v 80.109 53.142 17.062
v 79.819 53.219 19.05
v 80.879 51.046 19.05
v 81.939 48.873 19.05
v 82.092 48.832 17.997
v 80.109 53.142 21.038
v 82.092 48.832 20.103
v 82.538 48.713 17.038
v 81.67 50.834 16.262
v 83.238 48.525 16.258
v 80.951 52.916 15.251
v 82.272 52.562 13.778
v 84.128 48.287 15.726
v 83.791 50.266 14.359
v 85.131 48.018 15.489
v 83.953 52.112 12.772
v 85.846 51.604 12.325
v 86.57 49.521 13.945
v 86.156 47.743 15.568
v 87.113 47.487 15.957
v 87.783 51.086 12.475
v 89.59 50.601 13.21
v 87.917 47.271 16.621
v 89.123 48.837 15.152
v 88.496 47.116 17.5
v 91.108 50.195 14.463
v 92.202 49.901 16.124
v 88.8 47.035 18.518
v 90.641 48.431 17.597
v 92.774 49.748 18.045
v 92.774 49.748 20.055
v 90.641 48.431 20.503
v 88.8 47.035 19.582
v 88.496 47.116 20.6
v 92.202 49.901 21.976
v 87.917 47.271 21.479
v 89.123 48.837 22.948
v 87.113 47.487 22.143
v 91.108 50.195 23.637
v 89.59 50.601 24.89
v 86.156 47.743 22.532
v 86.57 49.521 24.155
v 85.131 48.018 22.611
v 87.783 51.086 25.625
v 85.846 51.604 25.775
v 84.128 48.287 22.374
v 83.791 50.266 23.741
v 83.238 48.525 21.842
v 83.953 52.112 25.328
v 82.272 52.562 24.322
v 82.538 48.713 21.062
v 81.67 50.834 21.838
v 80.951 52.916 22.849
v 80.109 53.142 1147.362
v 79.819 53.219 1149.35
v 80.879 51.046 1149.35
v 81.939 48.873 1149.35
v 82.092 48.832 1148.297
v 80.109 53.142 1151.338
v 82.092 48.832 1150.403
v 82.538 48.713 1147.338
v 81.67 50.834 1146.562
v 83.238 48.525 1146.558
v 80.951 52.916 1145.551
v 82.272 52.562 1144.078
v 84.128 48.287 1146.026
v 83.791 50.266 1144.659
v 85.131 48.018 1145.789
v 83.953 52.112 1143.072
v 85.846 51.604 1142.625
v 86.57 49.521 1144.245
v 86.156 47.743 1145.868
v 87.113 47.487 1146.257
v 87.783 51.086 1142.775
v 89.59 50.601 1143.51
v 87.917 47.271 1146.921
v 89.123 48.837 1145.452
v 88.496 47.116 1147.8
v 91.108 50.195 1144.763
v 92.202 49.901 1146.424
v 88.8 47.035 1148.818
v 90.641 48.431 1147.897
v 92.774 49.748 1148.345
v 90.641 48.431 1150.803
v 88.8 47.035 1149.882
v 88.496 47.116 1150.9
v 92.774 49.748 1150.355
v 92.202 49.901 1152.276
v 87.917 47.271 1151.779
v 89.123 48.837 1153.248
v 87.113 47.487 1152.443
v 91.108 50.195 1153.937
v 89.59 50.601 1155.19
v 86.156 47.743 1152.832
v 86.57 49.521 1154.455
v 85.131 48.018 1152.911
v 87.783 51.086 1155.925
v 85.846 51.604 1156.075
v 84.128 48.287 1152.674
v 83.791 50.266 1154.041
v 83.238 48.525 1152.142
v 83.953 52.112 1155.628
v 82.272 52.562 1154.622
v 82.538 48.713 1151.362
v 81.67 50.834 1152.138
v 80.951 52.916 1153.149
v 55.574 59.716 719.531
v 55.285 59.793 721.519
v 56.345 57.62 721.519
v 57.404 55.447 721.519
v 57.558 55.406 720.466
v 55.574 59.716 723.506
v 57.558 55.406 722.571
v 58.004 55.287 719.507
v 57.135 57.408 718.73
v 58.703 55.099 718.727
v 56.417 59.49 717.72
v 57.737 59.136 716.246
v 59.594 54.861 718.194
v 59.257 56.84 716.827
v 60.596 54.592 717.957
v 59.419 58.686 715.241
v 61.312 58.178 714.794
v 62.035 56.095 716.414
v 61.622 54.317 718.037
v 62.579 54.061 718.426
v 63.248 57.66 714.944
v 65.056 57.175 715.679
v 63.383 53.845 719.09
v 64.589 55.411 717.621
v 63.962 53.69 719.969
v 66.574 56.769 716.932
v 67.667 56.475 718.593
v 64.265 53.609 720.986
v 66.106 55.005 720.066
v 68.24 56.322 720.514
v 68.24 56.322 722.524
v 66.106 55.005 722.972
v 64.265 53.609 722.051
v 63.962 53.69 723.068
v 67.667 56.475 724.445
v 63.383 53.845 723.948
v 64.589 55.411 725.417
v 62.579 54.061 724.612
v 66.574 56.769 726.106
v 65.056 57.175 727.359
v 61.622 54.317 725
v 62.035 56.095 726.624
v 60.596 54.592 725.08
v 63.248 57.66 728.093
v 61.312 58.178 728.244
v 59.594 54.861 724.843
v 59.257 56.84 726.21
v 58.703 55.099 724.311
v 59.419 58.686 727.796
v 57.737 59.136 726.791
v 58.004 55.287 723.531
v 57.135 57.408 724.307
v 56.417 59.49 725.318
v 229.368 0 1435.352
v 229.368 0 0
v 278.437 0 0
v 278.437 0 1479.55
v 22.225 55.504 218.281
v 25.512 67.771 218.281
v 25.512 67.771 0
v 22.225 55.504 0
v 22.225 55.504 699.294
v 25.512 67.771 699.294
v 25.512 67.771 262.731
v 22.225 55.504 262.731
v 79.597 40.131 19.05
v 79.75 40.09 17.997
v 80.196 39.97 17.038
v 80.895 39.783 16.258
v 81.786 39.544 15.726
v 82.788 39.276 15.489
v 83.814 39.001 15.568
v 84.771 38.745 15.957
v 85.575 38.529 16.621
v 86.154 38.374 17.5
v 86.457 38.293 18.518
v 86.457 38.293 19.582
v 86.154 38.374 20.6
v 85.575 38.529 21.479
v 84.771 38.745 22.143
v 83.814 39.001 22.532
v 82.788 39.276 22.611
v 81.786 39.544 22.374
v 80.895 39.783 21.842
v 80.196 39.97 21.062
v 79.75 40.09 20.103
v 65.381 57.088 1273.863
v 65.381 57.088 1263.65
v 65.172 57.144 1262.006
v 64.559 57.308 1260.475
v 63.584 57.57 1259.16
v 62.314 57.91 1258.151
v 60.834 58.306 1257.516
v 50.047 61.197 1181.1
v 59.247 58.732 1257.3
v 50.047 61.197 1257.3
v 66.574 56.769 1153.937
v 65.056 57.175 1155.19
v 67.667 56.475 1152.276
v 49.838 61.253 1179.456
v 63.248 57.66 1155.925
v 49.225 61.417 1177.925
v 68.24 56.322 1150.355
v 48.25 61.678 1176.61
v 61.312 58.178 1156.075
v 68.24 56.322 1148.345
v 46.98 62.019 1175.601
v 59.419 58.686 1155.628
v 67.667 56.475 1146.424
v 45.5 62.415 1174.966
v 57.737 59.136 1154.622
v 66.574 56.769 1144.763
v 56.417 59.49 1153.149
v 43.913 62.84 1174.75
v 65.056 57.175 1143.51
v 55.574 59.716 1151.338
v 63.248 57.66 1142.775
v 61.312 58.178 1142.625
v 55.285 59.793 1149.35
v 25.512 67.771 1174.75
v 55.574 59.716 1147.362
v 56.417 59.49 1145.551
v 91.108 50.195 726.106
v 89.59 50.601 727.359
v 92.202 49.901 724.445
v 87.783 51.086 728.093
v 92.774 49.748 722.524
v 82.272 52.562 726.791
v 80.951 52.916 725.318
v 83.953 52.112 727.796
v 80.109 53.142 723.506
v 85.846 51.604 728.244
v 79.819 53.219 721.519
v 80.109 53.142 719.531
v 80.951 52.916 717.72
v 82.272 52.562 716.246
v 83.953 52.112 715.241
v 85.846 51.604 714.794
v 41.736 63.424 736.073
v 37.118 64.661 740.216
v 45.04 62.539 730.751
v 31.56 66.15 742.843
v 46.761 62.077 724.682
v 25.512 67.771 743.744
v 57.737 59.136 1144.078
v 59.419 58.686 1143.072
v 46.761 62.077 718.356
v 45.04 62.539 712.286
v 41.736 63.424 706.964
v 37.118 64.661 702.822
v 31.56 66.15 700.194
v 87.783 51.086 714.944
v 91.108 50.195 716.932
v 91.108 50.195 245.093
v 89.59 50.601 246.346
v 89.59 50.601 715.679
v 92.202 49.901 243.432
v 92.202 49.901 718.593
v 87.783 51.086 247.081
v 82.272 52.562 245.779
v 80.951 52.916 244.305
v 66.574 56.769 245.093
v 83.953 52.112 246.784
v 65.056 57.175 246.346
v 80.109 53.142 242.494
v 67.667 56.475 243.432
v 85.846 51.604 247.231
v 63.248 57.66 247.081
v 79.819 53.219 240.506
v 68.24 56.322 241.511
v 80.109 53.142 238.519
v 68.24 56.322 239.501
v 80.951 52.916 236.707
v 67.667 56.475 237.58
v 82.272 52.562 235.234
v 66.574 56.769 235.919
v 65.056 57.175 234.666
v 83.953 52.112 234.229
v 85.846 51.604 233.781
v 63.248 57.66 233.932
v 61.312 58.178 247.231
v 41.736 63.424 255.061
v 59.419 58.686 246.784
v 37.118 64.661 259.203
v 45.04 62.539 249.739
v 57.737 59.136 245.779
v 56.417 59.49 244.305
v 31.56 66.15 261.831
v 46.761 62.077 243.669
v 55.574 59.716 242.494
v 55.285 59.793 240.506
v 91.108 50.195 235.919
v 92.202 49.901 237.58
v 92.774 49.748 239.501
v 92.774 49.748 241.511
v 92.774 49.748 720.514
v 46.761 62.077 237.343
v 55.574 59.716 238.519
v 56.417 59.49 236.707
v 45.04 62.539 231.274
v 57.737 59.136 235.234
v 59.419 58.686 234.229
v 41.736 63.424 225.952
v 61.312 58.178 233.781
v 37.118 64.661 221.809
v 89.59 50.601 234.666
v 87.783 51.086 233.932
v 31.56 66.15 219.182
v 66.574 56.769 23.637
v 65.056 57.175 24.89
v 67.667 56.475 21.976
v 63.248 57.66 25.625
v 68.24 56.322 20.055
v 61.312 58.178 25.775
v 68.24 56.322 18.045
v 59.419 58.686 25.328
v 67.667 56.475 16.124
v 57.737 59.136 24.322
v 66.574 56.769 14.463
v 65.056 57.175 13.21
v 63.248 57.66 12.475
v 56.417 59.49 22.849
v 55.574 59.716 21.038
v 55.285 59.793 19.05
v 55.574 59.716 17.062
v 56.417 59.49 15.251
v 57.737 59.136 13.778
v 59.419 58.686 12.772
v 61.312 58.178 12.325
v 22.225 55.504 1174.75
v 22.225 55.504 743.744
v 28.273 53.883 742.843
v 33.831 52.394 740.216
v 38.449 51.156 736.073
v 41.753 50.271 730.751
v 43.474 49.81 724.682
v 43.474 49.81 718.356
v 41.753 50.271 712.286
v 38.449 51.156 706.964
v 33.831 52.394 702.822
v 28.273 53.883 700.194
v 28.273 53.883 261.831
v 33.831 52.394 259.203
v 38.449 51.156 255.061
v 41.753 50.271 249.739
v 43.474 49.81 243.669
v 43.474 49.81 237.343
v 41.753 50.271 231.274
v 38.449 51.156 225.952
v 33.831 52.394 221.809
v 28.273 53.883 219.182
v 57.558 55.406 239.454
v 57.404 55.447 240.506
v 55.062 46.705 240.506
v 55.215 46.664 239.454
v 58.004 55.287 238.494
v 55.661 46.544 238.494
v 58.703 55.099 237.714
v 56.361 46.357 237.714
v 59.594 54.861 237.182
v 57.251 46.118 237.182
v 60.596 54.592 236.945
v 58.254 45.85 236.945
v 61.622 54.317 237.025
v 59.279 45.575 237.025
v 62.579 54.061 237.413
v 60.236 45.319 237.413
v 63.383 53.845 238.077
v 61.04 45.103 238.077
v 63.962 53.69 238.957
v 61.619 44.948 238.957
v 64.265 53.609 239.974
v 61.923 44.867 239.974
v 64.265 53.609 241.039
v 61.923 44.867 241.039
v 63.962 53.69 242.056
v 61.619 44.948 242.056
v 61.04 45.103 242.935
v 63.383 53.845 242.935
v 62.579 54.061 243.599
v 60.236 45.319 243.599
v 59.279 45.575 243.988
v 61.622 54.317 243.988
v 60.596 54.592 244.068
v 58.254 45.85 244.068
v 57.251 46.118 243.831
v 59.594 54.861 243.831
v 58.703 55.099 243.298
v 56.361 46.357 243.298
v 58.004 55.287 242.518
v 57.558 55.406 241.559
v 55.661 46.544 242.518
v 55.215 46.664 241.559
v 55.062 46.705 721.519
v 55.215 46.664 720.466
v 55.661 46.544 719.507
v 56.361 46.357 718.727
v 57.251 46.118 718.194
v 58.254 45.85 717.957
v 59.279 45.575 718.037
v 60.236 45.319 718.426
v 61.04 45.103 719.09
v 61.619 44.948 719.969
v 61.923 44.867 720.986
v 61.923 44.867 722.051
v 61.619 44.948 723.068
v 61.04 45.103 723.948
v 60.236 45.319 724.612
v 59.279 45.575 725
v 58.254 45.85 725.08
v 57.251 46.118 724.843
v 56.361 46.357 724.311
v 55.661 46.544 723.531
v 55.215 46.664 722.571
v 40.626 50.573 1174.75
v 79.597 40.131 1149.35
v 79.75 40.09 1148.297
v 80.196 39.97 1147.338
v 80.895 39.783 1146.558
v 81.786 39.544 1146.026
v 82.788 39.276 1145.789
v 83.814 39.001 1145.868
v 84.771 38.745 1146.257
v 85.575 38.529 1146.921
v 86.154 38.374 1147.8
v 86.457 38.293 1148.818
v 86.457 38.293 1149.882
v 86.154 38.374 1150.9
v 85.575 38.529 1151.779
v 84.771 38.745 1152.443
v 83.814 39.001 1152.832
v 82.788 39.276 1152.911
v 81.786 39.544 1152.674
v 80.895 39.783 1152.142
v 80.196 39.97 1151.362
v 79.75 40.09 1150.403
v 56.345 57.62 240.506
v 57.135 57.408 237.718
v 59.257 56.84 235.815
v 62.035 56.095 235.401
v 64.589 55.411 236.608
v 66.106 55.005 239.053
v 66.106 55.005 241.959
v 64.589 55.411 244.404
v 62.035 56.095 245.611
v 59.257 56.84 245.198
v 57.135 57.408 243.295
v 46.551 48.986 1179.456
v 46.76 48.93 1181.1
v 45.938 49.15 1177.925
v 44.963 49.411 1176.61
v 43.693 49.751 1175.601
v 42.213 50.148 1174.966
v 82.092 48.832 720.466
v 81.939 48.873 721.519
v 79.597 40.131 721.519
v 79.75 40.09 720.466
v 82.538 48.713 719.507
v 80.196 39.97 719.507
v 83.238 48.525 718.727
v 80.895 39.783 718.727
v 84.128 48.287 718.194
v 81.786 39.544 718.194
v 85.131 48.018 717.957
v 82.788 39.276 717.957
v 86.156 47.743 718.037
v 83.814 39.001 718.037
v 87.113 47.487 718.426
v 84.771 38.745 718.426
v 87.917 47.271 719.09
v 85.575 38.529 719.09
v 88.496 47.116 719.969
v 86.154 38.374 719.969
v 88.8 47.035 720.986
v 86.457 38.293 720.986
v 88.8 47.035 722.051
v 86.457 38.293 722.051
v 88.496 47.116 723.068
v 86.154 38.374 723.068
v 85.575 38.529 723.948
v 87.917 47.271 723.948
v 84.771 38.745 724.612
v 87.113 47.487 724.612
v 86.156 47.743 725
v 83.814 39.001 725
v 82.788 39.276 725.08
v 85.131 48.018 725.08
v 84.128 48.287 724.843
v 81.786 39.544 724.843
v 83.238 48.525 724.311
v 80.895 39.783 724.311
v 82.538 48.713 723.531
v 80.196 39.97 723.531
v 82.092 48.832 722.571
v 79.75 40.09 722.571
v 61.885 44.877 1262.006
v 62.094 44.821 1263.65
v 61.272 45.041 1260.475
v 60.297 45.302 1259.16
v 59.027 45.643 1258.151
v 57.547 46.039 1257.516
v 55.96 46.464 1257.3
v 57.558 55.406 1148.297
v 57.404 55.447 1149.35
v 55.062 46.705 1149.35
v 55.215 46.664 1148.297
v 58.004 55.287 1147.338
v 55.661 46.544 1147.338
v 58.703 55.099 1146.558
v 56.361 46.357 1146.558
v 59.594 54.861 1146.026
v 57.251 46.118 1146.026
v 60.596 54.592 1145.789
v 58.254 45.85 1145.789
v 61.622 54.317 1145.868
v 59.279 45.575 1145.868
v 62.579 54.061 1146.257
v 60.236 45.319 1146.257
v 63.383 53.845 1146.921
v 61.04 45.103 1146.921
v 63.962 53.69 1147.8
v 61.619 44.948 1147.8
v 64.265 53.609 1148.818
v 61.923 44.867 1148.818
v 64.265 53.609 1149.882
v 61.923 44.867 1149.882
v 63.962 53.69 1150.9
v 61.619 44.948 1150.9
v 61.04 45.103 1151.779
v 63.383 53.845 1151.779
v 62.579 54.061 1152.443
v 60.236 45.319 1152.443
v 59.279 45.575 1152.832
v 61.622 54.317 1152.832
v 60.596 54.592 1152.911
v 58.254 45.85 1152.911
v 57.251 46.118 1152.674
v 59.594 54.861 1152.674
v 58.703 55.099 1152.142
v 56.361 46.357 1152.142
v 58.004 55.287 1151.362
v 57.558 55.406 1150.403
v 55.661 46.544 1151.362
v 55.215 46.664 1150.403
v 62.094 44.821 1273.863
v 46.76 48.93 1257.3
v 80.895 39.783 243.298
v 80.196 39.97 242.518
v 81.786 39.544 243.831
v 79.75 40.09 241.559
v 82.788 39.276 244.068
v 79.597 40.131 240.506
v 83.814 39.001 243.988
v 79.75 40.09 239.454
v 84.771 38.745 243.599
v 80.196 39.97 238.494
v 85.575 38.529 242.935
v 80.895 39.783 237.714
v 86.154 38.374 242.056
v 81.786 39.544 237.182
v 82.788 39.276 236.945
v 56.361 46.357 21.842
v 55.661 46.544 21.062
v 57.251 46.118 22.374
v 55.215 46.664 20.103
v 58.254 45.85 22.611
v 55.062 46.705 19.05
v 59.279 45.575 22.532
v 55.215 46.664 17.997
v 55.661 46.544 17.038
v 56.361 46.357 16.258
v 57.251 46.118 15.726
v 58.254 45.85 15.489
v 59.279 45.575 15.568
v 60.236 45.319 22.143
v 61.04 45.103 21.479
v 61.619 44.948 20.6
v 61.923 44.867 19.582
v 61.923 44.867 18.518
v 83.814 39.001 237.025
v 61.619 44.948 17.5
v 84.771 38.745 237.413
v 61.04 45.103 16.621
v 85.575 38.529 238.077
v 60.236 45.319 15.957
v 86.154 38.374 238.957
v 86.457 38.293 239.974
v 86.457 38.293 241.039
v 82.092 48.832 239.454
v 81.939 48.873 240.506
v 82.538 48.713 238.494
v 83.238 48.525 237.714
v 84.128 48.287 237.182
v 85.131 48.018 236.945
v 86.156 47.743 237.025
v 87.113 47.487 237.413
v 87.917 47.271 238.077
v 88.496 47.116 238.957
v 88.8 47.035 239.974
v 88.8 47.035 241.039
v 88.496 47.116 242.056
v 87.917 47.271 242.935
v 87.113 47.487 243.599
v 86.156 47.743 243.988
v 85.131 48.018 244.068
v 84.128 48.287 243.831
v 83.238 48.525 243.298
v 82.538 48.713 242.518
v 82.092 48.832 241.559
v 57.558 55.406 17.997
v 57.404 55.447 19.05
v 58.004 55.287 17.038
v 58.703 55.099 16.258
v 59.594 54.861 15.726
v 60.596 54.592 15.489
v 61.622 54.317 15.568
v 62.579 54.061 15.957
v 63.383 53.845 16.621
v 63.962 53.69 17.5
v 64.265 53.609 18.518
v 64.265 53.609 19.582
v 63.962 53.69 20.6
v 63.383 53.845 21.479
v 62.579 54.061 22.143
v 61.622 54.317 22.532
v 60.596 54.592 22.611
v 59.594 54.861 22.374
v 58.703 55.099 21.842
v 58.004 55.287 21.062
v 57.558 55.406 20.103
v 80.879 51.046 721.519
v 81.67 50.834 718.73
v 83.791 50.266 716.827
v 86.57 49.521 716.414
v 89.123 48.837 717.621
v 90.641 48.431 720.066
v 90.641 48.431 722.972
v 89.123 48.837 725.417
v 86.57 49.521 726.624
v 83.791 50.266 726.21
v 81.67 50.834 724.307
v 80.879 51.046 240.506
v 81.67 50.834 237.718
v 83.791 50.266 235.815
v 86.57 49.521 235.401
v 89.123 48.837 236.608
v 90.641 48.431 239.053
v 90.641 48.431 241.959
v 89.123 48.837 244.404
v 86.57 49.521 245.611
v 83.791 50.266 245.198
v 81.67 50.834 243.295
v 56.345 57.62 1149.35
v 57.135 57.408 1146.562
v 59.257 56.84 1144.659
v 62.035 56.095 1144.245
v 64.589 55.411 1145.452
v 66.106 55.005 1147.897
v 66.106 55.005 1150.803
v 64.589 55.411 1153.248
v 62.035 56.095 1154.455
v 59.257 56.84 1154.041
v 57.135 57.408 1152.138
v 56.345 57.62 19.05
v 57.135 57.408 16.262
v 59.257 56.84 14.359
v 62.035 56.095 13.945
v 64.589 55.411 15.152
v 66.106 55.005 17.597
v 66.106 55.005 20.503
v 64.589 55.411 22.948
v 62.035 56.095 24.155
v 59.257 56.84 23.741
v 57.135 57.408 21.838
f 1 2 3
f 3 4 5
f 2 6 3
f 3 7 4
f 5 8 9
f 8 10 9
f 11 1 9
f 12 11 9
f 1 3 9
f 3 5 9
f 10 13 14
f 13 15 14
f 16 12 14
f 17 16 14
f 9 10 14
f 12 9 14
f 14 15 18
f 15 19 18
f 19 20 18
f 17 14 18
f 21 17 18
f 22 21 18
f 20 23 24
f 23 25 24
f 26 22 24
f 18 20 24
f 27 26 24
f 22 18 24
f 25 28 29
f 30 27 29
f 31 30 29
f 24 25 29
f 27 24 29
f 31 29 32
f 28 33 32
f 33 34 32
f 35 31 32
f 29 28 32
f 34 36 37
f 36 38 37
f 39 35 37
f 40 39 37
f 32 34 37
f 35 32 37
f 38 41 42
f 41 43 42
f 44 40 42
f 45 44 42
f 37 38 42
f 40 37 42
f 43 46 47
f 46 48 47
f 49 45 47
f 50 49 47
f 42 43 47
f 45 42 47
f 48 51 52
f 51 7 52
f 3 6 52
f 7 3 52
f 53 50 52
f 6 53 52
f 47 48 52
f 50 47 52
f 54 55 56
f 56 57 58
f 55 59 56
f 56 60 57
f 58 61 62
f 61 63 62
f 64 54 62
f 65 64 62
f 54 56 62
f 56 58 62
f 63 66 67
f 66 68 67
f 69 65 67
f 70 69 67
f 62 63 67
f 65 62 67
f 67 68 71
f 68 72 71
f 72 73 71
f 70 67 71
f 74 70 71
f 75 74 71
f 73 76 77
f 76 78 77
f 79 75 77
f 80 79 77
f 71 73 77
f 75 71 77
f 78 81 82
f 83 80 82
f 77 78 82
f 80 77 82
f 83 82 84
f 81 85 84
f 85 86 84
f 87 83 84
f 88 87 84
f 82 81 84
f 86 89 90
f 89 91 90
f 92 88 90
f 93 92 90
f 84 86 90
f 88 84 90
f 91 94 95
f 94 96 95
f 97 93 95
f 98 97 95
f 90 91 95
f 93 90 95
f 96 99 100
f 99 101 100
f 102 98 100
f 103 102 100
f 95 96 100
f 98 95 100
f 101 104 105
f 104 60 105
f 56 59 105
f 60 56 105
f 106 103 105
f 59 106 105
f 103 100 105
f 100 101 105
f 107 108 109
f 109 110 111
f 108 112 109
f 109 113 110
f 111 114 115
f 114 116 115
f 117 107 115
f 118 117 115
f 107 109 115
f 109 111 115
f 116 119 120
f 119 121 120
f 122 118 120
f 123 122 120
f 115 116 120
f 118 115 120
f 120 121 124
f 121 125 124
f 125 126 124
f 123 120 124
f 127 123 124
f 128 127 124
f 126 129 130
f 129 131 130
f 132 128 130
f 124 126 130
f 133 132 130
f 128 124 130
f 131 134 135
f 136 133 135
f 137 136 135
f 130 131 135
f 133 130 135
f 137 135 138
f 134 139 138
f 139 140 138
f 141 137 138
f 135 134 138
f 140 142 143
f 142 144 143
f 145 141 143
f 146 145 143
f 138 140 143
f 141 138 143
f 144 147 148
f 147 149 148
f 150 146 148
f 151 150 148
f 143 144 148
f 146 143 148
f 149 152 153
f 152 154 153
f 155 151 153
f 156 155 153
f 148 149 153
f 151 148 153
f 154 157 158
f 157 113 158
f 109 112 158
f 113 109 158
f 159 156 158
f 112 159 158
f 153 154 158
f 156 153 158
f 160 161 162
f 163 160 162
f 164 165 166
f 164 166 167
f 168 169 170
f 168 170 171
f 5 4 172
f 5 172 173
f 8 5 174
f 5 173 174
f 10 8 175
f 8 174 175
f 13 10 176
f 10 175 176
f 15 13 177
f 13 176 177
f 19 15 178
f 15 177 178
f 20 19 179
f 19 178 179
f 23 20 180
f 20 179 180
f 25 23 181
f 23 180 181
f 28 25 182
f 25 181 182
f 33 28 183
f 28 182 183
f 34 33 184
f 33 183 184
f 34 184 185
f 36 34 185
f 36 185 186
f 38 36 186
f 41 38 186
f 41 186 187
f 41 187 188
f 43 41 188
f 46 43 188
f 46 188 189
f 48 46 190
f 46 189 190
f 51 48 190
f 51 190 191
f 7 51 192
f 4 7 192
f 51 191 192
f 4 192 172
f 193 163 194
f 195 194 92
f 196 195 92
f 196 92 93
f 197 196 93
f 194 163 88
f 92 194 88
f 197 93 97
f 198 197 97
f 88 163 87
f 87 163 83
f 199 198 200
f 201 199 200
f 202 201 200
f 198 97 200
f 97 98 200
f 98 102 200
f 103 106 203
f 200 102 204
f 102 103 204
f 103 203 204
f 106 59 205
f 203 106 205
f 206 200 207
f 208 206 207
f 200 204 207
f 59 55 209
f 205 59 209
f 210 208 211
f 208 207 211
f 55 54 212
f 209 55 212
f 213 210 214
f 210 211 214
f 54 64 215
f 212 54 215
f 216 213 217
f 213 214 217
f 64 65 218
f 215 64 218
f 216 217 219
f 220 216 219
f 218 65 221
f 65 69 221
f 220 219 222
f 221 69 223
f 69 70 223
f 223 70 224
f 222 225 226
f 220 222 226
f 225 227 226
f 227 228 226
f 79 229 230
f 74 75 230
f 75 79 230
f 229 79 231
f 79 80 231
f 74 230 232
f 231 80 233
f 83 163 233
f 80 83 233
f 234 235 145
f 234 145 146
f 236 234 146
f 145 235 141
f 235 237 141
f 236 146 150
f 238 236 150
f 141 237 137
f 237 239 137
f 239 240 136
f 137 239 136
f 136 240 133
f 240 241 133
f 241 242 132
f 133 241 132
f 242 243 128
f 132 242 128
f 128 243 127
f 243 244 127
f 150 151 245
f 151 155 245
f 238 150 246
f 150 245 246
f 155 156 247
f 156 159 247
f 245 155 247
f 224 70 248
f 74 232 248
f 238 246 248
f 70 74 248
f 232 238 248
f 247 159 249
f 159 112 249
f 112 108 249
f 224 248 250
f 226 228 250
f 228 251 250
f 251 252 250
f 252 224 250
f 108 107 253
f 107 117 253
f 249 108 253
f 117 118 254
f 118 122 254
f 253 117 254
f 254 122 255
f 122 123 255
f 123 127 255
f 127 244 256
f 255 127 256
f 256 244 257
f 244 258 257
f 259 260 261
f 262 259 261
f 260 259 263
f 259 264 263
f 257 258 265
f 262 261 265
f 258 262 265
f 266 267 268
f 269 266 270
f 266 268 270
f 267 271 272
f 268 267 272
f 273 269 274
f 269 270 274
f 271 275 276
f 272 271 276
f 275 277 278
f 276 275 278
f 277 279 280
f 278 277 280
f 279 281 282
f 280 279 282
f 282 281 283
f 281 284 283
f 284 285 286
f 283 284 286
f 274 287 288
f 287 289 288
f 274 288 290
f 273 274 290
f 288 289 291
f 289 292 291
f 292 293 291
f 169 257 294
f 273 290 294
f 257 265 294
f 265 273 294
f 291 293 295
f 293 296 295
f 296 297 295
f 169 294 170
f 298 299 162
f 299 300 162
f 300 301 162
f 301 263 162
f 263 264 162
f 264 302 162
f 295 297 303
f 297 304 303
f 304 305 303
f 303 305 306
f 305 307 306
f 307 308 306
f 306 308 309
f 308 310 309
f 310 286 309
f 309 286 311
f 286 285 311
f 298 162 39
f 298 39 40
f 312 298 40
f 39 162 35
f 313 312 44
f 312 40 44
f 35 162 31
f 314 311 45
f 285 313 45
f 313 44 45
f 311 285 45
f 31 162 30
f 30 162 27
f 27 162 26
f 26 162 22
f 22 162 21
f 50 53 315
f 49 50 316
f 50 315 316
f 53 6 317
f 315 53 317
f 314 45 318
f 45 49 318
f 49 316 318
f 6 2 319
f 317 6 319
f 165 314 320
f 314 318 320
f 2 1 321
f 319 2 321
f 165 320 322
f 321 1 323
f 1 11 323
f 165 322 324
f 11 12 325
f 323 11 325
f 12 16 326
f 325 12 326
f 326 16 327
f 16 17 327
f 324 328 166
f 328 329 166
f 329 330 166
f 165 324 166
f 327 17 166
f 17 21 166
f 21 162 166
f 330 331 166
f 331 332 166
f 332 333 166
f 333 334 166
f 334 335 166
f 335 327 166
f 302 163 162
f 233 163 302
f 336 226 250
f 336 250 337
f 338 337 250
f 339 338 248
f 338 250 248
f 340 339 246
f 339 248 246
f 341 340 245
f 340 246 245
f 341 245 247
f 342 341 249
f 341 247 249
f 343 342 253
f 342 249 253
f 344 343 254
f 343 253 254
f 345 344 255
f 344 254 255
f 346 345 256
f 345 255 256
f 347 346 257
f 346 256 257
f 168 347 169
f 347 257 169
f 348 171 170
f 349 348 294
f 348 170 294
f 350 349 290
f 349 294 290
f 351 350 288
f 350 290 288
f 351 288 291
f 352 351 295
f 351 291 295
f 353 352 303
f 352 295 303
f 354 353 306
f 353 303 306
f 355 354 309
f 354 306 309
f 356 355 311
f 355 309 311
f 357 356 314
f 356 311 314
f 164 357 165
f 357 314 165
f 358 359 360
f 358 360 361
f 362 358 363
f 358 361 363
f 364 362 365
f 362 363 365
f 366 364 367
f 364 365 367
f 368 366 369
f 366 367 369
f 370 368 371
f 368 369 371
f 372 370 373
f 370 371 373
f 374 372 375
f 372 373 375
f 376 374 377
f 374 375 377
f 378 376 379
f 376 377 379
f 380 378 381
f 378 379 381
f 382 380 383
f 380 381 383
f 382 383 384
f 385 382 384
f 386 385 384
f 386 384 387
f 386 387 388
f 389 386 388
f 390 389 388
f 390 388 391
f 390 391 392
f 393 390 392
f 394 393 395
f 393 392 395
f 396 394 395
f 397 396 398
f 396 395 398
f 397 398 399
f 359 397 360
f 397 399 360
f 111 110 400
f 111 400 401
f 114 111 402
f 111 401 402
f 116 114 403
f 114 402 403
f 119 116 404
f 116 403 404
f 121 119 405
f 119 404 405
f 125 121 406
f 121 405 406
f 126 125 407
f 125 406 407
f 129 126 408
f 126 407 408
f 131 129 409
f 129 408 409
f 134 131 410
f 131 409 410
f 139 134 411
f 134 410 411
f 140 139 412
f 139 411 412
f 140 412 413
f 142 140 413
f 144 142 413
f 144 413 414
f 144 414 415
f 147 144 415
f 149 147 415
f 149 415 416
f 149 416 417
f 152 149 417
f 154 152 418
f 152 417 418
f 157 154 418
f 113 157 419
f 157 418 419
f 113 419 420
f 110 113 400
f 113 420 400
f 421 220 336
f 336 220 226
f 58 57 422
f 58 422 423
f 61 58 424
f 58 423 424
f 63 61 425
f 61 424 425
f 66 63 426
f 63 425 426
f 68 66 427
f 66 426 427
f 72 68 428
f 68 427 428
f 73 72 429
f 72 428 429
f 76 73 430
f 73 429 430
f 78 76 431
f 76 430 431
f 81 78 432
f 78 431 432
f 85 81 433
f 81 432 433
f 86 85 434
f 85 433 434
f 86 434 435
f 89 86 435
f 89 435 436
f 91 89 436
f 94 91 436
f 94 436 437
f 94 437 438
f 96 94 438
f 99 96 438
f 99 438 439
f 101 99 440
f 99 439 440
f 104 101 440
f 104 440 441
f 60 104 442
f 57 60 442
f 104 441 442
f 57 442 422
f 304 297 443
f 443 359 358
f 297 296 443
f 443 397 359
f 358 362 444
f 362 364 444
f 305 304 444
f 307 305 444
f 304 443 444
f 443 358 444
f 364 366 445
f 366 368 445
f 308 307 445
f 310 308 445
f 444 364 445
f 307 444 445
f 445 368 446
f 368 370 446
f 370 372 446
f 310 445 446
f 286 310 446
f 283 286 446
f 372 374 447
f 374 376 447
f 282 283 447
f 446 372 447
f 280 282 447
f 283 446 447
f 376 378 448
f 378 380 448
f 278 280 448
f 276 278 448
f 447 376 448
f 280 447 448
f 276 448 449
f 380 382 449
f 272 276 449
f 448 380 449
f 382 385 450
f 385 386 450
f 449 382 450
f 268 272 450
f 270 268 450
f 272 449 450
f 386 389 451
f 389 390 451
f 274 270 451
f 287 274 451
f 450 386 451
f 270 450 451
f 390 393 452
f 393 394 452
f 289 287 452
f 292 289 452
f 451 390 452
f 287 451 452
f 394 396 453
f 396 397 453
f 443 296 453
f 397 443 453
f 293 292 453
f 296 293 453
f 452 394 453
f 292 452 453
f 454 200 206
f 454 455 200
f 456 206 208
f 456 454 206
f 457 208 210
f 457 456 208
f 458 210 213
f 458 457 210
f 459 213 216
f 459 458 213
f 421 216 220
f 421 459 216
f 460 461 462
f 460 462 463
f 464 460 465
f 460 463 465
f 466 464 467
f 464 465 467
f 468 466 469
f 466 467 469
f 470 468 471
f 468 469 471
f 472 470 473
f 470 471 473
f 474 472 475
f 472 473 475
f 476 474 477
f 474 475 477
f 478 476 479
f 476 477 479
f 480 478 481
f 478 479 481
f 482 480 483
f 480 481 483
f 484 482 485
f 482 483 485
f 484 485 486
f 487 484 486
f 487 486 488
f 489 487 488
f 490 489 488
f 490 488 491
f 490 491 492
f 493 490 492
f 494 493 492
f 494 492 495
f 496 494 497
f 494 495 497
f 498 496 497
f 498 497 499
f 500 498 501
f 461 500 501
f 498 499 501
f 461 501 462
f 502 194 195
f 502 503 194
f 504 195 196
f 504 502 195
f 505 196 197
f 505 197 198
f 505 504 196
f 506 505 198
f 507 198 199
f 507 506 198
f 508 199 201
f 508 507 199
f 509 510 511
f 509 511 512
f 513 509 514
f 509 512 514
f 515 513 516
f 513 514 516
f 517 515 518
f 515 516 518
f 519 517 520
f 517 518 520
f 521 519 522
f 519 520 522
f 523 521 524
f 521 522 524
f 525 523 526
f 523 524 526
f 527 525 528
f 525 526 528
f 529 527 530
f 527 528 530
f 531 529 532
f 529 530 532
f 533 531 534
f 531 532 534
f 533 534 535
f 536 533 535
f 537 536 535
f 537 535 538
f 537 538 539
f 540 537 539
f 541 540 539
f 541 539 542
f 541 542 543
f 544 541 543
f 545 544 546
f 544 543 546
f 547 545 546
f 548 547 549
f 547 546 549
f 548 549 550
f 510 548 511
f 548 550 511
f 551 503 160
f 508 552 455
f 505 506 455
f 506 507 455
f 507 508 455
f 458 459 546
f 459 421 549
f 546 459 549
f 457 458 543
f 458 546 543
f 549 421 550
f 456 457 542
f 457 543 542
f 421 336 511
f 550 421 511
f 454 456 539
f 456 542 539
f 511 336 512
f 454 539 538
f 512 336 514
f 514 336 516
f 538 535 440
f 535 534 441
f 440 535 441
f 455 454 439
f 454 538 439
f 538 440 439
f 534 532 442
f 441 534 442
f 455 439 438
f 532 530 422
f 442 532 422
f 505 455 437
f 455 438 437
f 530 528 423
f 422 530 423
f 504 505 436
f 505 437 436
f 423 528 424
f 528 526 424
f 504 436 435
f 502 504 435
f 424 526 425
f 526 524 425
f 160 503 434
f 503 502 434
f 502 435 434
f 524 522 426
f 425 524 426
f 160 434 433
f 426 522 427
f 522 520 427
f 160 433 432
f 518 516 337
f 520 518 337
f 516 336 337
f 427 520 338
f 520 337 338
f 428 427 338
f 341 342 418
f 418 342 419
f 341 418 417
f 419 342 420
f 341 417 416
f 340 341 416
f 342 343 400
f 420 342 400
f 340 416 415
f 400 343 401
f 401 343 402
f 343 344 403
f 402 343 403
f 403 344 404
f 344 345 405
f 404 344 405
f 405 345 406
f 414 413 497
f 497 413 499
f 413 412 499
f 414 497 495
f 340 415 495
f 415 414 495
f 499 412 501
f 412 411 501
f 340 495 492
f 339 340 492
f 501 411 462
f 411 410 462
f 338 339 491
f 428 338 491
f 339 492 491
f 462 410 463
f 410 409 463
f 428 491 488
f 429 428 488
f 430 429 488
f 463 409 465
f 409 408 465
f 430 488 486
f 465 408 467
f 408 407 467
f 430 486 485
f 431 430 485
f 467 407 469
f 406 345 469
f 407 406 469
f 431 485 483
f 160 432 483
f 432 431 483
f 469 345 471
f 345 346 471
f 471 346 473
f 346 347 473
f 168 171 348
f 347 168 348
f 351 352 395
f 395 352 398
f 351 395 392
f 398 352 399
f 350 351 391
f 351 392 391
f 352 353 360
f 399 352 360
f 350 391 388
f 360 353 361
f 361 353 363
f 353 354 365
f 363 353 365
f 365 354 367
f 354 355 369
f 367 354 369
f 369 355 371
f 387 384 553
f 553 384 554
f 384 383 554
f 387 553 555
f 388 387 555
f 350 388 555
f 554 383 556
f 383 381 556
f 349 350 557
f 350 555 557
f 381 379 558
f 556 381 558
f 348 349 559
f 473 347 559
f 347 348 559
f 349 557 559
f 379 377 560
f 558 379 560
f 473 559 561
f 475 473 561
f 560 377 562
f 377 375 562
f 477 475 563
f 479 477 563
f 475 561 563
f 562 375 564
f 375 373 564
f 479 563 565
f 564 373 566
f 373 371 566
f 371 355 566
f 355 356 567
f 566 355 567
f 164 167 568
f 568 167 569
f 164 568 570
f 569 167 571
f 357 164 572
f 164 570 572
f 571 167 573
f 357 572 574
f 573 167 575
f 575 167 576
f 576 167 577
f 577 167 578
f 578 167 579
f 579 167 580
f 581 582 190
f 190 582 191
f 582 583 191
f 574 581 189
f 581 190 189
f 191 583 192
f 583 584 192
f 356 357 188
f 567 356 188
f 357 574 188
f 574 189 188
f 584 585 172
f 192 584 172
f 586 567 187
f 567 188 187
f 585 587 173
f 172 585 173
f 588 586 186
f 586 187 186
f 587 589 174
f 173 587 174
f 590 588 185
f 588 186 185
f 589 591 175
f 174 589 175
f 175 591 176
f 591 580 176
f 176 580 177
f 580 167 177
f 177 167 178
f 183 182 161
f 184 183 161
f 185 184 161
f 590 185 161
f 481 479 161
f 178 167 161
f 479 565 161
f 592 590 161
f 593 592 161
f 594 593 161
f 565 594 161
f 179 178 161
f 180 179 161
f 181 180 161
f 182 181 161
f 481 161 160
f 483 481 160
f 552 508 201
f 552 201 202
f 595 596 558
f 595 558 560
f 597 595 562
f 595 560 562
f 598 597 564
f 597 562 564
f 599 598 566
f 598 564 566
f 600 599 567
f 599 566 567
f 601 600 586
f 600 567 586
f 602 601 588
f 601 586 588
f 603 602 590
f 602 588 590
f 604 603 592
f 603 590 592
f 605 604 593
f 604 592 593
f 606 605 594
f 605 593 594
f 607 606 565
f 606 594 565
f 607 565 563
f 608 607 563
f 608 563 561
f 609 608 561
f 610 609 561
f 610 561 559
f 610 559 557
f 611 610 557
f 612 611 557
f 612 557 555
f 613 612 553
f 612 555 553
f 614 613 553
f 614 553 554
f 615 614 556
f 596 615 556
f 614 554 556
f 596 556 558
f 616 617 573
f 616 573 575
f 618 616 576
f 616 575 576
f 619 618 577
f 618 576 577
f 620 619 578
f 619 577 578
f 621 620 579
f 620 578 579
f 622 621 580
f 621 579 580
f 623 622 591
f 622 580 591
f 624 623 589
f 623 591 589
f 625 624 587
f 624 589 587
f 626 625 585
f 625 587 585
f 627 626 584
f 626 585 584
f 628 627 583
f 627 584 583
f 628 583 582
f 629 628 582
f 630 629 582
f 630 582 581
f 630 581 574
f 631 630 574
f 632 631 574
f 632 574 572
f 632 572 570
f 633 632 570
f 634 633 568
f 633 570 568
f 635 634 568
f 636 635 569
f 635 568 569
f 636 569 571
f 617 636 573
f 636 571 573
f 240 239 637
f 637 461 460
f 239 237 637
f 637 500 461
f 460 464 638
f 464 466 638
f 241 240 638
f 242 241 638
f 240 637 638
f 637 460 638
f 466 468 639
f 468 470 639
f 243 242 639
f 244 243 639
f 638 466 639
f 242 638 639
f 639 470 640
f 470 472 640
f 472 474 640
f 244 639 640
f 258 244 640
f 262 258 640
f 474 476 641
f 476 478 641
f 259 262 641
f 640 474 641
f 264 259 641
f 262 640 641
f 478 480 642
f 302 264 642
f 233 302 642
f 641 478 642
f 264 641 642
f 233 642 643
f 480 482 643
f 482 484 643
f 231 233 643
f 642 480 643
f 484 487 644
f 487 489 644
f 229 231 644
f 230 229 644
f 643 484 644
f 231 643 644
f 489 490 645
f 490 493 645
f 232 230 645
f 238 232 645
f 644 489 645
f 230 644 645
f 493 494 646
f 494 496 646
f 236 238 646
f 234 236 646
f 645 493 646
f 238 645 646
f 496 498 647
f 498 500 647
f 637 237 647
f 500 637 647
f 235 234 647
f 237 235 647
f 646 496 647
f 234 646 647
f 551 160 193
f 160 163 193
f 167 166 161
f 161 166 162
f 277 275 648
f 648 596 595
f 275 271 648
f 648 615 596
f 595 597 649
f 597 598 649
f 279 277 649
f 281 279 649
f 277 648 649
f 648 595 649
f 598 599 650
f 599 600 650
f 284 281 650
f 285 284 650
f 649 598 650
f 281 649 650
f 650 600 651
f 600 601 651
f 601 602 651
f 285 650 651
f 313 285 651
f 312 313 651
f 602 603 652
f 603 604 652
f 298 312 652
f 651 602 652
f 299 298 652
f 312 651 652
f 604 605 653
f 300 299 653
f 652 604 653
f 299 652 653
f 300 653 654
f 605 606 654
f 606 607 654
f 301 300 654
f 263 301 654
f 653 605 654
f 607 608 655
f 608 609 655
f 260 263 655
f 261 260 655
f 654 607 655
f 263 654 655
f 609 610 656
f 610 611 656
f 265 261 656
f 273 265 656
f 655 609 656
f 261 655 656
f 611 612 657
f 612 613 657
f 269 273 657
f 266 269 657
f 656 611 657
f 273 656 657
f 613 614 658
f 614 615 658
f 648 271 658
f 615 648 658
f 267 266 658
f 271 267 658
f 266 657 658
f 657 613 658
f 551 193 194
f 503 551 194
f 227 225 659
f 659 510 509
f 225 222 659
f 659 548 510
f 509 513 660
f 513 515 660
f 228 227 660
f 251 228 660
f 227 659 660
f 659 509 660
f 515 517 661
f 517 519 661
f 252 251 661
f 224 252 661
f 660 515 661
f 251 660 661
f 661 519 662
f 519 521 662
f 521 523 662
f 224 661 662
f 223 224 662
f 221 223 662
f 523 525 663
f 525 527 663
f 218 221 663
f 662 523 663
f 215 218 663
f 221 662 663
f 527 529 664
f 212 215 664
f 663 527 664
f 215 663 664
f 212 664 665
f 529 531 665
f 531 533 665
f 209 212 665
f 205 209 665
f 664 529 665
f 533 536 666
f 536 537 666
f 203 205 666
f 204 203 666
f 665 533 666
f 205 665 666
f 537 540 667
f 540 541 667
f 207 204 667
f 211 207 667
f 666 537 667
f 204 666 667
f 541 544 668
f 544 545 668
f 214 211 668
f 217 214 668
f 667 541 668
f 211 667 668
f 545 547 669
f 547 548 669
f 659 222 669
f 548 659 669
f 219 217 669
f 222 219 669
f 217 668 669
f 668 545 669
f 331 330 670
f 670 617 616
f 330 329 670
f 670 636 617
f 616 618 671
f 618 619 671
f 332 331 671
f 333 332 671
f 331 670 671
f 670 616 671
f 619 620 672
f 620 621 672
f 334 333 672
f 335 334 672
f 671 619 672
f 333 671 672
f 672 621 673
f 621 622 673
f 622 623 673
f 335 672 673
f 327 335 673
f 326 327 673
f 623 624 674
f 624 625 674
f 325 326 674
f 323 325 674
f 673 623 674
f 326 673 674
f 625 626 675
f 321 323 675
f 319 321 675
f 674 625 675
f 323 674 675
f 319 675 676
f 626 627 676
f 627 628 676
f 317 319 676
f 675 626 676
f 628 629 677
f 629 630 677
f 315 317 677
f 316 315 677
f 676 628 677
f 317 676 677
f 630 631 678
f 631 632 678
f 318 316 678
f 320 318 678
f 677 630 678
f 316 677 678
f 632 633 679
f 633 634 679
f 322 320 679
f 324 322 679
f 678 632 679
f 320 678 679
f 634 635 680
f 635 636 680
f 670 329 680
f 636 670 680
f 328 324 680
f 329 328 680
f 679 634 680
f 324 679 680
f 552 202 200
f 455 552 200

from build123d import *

# Parameters (mm, degrees)
BOSS_EXTRUDE1_DEPTH                                 = 1479.55
CSK_FOR_1_4_FLAT_HEAD_SOCKET_CAP_SCREW1_D           = 7.14248
CSK_FOR_1_4_FLAT_HEAD_SOCKET_CAP_SCREW1_CSINK_D     = 13.4874
CSK_FOR_1_4_FLAT_HEAD_SOCKET_CAP_SCREW1_CSINK_ANGLE = 82
SKETCH4_R                                           = 22.225
CUT_EXTRUDE1_DEPTH                                  = 67.312434508
CUT_EXTRUDE2_DEPTH                                  = 67.312434508
FILLET1_R                                           = 6.35


with BuildPart() as part:
    # Sketch1 → Boss-Extrude1 (new body)
    with BuildSketch(Plane.XY):
        Polygon((22.225, 55.50367642), (229.367540407, 0), (278.436572382, 0), (25.512001873, 67.770934414), align=None)
    extrude(amount=BOSS_EXTRUDE1_DEPTH)

    # CSK for 1/4 Flat Head Socket Cap Screw1 (through all)
    with Locations(Plane(origin=(18.651713678, 69.609143096, 0), x_dir=(0.965925826, -0.258819045, 0), z_dir=(0.258819045, 0.965925826, 0))):
        with Locations((44.668892959, -721.51875), (70.068892959, -721.51875), (44.668892959, -240.50625), (70.068892959, -240.50625), (44.668892959, -1149.35), (70.068892959, -1149.35), (44.668892959, -19.05), (70.068892959, -19.05)):
            CounterSinkHole(CSK_FOR_1_4_FLAT_HEAD_SOCKET_CAP_SCREW1_D / 2, CSK_FOR_1_4_FLAT_HEAD_SOCKET_CAP_SCREW1_CSINK_D / 2, counter_sink_angle=CSK_FOR_1_4_FLAT_HEAD_SOCKET_CAP_SCREW1_CSINK_ANGLE)

    # Sketch4 → Cut-Extrude1 (cut, through all)
    with BuildSketch(Plane(origin=(18.651713678, 69.609143096, 0), x_dir=(0.965925826, -0.258819045, 0), z_dir=(0.258819045, 0.965925826, 0))):
        with Locations((7.102292959, -240.50625)):
            Circle(SKETCH4_R)
        with Locations((7.102292959, -721.51875)):
            Circle(SKETCH4_R)
    extrude(amount=-CUT_EXTRUDE1_DEPTH, mode=Mode.SUBTRACT)

    # Sketch5 → Cut-Extrude2 (cut, through all)
    with BuildSketch(Plane(origin=(18.651713678, 69.609143096, 0), x_dir=(0.965925826, -0.258819045, 0), z_dir=(0.258819045, 0.965925826, 0))):
        Polygon((268.949076248, -1479.55), (48.377292959, -1273.863484507), (48.377292959, -1257.3), (32.502292959, -1257.3), (32.502292959, -1174.75), (7.102292959, -1174.75), (7.102292959, -1479.55), align=None)
    extrude(amount=-CUT_EXTRUDE2_DEPTH, mode=Mode.SUBTRACT)

    # Fillet1
    fillet1_edges = [part.edges().sort_by_distance(p)[0] for p in [
        (63.737089416, 50.954549331, 1257.3),
        (48.403016924, 55.063301672, 1174.75),
    ]]
    fillet(fillet1_edges, radius=FILLET1_R)


solid = part.part
